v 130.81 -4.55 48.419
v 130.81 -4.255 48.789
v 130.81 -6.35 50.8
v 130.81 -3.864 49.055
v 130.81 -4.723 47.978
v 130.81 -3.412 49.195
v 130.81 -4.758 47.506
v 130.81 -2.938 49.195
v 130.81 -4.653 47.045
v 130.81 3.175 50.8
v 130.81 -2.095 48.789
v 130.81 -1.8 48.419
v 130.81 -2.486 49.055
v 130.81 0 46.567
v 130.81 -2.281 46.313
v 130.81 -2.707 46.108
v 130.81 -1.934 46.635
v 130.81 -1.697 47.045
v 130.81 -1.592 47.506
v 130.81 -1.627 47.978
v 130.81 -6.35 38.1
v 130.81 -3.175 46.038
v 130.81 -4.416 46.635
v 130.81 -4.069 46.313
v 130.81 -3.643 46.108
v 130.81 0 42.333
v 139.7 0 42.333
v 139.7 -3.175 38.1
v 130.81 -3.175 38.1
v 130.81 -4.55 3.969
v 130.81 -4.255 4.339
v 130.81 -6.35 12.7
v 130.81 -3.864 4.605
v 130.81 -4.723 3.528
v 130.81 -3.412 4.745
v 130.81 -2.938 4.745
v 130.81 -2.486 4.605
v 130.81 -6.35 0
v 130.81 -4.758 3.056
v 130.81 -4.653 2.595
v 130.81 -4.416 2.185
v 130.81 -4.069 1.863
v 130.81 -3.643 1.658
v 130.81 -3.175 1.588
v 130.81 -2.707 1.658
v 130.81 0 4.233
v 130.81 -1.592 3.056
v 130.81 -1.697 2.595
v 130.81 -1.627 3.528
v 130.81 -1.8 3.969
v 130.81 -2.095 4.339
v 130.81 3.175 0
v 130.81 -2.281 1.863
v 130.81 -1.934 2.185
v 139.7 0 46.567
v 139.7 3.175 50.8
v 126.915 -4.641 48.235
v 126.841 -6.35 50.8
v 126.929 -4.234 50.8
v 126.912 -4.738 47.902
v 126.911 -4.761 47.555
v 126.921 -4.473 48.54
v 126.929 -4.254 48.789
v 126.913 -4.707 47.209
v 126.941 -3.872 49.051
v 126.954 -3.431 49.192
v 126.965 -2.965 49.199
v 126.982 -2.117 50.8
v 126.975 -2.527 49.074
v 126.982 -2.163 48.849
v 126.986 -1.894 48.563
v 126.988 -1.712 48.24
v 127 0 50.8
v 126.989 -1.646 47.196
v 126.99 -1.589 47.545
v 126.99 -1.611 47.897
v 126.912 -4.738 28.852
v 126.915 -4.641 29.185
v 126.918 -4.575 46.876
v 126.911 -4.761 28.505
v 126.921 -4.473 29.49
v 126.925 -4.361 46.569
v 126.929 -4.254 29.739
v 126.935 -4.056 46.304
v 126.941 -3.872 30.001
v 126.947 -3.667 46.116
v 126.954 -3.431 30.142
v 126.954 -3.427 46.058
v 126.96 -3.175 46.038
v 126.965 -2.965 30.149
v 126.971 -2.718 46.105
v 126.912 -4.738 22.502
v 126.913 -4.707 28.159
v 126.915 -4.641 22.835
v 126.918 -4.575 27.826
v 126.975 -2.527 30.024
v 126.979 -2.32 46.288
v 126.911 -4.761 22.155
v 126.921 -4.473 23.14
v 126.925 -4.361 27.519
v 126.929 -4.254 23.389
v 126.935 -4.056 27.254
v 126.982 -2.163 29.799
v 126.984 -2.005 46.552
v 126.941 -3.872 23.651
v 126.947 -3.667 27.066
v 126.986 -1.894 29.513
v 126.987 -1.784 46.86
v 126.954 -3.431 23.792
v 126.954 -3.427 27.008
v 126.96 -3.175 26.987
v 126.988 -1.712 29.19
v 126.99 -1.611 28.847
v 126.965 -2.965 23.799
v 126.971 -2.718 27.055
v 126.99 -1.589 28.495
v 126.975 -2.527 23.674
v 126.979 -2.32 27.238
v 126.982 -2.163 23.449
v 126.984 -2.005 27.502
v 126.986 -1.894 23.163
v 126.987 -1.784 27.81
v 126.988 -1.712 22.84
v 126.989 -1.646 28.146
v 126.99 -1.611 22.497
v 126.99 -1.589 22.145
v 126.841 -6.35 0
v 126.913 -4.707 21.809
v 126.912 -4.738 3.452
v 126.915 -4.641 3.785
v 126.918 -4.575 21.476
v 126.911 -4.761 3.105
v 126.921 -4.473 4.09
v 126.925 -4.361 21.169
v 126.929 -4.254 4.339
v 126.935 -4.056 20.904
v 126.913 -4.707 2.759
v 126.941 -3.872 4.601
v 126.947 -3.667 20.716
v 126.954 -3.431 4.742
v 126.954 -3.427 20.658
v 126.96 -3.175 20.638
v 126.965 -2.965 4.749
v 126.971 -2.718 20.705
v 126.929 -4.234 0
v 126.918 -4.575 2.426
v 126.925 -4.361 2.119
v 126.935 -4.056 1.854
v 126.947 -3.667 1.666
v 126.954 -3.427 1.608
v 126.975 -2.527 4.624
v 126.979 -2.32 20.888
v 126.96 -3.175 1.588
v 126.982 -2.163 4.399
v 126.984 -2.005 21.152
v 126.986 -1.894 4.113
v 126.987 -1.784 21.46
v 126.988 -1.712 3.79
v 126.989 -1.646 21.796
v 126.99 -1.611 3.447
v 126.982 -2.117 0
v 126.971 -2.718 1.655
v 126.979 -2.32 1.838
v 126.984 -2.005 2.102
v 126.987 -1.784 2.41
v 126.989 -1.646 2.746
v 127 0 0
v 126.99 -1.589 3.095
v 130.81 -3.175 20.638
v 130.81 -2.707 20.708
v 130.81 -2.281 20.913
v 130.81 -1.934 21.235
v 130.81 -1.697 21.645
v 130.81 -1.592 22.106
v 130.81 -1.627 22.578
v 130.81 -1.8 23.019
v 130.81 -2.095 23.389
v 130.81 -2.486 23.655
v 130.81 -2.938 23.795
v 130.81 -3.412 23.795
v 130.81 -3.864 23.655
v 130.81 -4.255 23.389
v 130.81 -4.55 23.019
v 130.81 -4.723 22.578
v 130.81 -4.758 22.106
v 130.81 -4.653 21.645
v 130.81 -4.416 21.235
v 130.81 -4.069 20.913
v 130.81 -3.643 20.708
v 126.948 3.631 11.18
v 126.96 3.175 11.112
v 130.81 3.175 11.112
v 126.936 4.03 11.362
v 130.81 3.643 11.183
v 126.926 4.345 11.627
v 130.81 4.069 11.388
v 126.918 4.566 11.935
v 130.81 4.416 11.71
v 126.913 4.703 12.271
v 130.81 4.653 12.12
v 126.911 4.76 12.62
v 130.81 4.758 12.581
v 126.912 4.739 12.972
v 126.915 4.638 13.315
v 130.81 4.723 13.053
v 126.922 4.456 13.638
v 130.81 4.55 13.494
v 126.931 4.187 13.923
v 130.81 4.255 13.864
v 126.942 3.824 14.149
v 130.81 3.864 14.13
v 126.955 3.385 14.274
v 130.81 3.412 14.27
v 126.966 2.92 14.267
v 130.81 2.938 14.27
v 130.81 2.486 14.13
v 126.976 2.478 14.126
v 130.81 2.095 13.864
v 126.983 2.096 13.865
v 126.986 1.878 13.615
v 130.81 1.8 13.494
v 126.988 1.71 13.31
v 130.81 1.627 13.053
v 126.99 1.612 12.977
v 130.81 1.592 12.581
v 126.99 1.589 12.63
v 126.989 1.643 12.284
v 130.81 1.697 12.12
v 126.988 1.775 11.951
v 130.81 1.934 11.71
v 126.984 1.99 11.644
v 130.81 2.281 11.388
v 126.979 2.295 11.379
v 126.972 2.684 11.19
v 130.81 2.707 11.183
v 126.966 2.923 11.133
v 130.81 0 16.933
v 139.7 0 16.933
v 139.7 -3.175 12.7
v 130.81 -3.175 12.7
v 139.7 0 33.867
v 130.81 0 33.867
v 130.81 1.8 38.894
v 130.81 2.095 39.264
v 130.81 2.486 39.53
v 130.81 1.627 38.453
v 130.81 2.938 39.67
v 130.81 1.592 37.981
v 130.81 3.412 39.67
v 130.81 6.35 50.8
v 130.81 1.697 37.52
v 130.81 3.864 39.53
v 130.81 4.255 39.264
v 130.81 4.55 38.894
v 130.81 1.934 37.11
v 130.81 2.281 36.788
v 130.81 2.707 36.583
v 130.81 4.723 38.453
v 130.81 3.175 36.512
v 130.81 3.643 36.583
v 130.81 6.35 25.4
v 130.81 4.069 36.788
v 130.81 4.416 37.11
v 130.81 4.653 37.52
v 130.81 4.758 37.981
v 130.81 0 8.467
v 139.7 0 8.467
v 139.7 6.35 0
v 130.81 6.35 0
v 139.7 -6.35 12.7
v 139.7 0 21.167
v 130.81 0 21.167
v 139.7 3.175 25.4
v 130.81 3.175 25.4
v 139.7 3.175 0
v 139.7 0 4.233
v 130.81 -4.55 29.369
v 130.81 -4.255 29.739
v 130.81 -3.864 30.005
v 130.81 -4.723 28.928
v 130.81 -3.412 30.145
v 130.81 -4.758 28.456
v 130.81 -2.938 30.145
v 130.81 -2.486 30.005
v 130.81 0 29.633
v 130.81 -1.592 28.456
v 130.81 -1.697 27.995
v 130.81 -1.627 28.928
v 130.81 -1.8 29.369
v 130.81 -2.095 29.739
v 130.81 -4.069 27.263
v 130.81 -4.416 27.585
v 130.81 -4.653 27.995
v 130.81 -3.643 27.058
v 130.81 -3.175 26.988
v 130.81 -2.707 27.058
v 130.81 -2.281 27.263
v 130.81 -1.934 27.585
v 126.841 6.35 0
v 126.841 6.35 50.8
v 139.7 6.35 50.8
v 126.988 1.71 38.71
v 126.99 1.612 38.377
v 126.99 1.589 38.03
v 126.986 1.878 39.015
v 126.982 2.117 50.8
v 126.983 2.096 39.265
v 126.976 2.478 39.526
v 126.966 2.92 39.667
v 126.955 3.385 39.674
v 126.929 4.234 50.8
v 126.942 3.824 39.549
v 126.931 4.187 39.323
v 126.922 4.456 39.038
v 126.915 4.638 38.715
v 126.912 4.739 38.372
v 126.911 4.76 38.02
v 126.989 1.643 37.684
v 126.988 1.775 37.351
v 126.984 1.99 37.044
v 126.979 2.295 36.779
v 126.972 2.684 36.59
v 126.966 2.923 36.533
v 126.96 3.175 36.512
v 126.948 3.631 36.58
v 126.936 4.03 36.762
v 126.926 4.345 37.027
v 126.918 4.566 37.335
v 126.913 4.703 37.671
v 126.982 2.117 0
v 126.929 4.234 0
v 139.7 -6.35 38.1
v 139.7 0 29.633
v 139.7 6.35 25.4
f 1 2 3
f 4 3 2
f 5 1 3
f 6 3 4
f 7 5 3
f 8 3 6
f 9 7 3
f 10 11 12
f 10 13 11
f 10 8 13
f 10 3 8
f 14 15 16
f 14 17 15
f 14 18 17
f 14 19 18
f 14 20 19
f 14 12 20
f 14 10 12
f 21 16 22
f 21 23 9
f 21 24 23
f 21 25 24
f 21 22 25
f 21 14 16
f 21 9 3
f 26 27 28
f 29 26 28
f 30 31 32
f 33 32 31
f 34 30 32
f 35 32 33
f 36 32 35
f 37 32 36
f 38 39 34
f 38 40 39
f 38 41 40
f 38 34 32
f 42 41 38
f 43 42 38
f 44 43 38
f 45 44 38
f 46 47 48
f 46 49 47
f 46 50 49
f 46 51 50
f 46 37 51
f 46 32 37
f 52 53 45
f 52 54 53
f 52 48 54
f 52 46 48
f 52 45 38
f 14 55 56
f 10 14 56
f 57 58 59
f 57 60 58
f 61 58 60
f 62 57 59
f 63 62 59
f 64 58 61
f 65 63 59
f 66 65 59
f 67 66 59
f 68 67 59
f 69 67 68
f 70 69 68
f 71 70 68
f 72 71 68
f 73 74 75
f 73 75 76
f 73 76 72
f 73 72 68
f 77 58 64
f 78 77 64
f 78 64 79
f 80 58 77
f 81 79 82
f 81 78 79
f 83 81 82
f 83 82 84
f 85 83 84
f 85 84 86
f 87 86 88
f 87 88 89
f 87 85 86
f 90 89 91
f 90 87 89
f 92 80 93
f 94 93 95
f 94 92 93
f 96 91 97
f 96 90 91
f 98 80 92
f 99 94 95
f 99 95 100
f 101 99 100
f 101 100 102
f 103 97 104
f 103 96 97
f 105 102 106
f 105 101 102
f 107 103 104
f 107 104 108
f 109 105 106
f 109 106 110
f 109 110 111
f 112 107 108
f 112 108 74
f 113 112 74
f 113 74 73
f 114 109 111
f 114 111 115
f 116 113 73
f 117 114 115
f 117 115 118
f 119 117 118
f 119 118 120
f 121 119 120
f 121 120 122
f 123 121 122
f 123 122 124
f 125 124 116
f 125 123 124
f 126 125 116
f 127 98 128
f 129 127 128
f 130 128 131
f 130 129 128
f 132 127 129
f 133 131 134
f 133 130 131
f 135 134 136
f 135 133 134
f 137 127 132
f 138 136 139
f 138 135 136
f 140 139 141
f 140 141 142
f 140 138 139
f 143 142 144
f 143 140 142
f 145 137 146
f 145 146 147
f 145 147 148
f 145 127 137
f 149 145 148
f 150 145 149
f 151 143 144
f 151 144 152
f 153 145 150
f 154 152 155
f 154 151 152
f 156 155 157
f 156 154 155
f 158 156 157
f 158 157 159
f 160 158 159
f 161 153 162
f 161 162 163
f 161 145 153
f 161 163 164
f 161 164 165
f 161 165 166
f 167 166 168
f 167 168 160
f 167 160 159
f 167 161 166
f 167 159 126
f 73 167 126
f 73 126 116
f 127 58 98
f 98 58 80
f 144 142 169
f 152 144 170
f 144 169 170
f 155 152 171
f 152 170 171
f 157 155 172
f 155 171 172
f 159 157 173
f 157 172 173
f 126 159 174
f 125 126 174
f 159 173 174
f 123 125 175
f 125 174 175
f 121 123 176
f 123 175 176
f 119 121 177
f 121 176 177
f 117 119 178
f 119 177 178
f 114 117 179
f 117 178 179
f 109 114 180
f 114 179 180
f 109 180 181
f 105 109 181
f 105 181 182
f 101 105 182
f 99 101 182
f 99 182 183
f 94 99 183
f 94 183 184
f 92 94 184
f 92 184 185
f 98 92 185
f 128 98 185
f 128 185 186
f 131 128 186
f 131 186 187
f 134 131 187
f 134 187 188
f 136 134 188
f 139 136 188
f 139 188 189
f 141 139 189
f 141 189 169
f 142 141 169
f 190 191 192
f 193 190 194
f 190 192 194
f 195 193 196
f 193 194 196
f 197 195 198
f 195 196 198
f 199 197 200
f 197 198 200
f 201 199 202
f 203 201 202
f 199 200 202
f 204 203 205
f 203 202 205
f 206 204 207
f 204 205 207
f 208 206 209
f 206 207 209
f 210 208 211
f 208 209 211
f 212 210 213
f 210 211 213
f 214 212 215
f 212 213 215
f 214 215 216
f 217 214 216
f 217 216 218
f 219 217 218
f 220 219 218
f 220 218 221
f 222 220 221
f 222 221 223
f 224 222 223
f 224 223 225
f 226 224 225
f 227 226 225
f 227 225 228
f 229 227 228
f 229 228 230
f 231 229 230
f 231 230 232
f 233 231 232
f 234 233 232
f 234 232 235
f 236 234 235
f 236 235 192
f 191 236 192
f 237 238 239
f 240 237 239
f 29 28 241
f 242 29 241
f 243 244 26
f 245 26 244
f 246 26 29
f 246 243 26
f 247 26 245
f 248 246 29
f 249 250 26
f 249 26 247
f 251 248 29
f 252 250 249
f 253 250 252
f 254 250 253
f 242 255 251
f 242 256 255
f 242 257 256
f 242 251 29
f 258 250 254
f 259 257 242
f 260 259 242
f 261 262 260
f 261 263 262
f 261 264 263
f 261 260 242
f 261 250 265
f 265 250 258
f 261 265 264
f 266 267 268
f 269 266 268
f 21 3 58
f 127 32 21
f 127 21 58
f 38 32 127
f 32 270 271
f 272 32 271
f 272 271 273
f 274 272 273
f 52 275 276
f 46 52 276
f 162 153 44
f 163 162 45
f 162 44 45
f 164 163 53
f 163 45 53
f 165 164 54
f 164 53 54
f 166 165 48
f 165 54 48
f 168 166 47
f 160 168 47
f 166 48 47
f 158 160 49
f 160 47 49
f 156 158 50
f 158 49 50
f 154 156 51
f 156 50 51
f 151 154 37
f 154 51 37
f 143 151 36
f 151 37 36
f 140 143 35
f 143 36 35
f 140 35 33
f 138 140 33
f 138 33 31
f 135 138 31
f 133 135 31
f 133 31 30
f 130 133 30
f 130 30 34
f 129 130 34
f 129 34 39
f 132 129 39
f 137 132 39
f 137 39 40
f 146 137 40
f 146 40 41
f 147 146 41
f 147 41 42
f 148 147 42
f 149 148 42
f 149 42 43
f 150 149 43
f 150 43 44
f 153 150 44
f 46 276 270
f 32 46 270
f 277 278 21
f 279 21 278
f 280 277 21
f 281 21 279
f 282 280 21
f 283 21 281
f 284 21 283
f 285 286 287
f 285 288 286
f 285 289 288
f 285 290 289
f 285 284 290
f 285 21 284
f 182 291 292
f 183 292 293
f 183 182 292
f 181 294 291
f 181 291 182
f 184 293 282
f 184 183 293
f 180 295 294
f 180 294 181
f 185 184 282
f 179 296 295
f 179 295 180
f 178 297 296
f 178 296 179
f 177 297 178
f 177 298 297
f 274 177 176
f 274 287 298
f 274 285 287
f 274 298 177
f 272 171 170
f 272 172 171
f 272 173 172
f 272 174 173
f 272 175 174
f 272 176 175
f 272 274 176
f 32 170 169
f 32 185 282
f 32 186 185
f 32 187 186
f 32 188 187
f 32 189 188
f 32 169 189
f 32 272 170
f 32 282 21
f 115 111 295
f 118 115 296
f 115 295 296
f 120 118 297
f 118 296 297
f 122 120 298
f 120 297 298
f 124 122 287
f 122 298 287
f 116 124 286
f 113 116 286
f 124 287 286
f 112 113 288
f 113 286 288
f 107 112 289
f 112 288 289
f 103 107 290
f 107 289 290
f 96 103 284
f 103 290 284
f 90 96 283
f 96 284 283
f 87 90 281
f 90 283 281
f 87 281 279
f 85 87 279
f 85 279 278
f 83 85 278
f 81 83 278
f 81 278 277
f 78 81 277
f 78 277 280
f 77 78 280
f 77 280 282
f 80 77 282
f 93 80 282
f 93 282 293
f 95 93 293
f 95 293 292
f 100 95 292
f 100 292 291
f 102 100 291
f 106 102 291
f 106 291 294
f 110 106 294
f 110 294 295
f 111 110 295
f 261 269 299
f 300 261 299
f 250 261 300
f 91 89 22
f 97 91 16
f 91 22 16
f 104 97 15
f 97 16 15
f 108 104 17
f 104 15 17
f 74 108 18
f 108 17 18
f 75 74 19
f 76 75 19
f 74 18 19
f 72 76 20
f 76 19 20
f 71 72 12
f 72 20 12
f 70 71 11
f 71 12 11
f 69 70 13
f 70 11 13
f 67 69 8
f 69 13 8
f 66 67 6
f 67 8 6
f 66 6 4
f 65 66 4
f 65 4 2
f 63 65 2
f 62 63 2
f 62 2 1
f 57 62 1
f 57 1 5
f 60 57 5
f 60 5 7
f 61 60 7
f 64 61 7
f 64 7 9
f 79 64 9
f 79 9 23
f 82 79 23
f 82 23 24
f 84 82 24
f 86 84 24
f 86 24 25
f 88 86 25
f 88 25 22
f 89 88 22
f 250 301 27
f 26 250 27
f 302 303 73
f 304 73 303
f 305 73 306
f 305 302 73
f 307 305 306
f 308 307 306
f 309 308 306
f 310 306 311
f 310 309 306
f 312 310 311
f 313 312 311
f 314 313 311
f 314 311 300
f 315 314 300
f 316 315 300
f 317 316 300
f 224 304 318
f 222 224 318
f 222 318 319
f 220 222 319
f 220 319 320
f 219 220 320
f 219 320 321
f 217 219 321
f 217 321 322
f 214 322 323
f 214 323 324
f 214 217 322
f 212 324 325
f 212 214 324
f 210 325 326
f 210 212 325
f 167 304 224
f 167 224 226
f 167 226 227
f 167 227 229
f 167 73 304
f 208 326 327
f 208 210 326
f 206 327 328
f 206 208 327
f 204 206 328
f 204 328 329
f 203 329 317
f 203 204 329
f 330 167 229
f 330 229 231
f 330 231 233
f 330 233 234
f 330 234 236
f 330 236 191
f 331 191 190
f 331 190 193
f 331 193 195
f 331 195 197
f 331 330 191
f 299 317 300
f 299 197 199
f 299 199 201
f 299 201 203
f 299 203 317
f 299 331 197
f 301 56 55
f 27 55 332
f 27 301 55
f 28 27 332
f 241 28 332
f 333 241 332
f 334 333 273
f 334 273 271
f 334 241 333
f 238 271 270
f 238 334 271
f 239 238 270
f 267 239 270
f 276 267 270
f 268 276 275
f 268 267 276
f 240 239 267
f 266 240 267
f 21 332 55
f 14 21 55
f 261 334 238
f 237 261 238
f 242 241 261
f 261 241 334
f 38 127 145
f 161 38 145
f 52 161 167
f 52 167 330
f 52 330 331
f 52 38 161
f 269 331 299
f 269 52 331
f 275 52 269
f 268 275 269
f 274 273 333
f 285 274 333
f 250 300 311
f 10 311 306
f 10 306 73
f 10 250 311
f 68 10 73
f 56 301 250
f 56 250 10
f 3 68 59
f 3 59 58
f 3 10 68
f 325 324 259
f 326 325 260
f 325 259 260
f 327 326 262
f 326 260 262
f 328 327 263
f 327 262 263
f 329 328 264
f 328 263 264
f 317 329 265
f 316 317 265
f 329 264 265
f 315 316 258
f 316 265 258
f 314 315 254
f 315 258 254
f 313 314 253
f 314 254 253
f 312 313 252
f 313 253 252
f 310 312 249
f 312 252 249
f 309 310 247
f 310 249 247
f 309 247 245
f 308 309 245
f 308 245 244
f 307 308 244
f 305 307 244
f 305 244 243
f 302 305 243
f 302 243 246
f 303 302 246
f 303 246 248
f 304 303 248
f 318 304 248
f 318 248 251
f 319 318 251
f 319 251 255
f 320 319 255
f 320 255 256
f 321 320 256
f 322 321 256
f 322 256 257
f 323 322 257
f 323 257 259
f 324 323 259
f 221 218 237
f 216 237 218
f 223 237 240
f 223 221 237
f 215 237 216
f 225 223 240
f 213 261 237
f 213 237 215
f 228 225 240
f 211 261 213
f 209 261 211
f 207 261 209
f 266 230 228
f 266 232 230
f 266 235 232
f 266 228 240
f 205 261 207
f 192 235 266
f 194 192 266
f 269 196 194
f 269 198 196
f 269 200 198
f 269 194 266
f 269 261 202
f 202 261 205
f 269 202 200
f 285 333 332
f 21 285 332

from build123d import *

# Parameters (mm, degrees)
SKETCH1_R           = 127
BOSS_EXTRUDE1_DEPTH = 50.8
SKETCH2_W           = 25.4
SKETCH2_H           = 12.7
SKETCH2_R           = 1.5875
BOSS_EXTRUDE2_DEPTH = 15.24
SKETCH2_4_R         = 1.5875
CUT_EXTRUDE1_DEPTH  = 8.89
LPATTERN1_COUNT     = 2
LPATTERN1_PITCH     = 25.4
SKETCH1_2_R         = 127
CUT_EXTRUDE2_DEPTH  = 196.514014843


with BuildPart() as part:
    # Sketch1 → Boss-Extrude1 (new body)
    with BuildSketch(Plane.XY):
        Circle(SKETCH1_R)
    extrude(amount=BOSS_EXTRUDE1_DEPTH)


with BuildPart() as body_2:
    # Sketch2 → Boss-Extrude2 (new body)
    with BuildSketch(Plane(origin=(139.7, 0, 0), x_dir=(0, 0, -1), z_dir=(1, 0, 0))):
        with Locations((-12.7, 0)):
            Rectangle(SKETCH2_W, SKETCH2_H)
        with Locations((-3.175, -3.175)):
            Circle(SKETCH2_R, mode=Mode.SUBTRACT)
        with Locations((-22.225, -3.175)):
            Circle(SKETCH2_R, mode=Mode.SUBTRACT)
        with Locations((-12.7, 3.175)):
            Circle(SKETCH2_R, mode=Mode.SUBTRACT)
    extrude(amount=-BOSS_EXTRUDE2_DEPTH)

    # Sketch2<4> → Cut-Extrude1 (cut)
    # profile 1 of 3: a face of its own
    with BuildSketch(Plane(origin=(139.7, 0, 0), x_dir=(0, 0, -1), z_dir=(1, 0, 0))):
        Polygon((0, -6.35), (0, 3.175), (-12.7, -6.35), align=None)
        with Locations((-3.175, -3.175)):
            Circle(SKETCH2_4_R, mode=Mode.SUBTRACT)
    # profile 2 of 3: a face of its own
    with BuildSketch(Plane(origin=(139.7, 0, 0), x_dir=(0, 0, -1), z_dir=(1, 0, 0))):
        Polygon((-12.7, -3.175), (0, 6.35), (-25.4, 6.35), align=None)
        with Locations((-12.7, 3.175)):
            Circle(SKETCH2_4_R, mode=Mode.SUBTRACT)
    # profile 3 of 3: a face of its own
    with BuildSketch(Plane(origin=(139.7, 0, 0), x_dir=(0, 0, -1), z_dir=(1, 0, 0))):
        Polygon((-25.4, -6.35), (-12.7, -6.35), (-25.4, 3.175), align=None)
        with Locations((-22.225, -3.175)):
            Circle(SKETCH2_4_R, mode=Mode.SUBTRACT)
    extrude(amount=-CUT_EXTRUDE1_DEPTH, mode=Mode.SUBTRACT)


with BuildPart() as lpattern1_1:
    # LPattern1: pattern copy
    add(body_2.part.moved(Location(Vector(0, 0, 1) * (1 * LPATTERN1_PITCH))))

    # Combine1: union body 2
    add(body_2.part)


with BuildPart() as cut_extrude2_tool:
    # Sketch1<2> → Cut-Extrude2 (new, through all)
    with BuildSketch(Plane.XY):
        Circle(SKETCH1_2_R)
    extrude(amount=CUT_EXTRUDE2_DEPTH)


with BuildPart() as part_1:
    add(part.part)

    # Cut-Extrude2: cut by cut_extrude2_tool
    add(cut_extrude2_tool.part, mode=Mode.SUBTRACT)


with BuildPart() as lpattern1_1_1:
    add(lpattern1_1.part)

    # Cut-Extrude2: cut by cut_extrude2_tool
    add(cut_extrude2_tool.part, mode=Mode.SUBTRACT)


solid = lpattern1_1_1.part
